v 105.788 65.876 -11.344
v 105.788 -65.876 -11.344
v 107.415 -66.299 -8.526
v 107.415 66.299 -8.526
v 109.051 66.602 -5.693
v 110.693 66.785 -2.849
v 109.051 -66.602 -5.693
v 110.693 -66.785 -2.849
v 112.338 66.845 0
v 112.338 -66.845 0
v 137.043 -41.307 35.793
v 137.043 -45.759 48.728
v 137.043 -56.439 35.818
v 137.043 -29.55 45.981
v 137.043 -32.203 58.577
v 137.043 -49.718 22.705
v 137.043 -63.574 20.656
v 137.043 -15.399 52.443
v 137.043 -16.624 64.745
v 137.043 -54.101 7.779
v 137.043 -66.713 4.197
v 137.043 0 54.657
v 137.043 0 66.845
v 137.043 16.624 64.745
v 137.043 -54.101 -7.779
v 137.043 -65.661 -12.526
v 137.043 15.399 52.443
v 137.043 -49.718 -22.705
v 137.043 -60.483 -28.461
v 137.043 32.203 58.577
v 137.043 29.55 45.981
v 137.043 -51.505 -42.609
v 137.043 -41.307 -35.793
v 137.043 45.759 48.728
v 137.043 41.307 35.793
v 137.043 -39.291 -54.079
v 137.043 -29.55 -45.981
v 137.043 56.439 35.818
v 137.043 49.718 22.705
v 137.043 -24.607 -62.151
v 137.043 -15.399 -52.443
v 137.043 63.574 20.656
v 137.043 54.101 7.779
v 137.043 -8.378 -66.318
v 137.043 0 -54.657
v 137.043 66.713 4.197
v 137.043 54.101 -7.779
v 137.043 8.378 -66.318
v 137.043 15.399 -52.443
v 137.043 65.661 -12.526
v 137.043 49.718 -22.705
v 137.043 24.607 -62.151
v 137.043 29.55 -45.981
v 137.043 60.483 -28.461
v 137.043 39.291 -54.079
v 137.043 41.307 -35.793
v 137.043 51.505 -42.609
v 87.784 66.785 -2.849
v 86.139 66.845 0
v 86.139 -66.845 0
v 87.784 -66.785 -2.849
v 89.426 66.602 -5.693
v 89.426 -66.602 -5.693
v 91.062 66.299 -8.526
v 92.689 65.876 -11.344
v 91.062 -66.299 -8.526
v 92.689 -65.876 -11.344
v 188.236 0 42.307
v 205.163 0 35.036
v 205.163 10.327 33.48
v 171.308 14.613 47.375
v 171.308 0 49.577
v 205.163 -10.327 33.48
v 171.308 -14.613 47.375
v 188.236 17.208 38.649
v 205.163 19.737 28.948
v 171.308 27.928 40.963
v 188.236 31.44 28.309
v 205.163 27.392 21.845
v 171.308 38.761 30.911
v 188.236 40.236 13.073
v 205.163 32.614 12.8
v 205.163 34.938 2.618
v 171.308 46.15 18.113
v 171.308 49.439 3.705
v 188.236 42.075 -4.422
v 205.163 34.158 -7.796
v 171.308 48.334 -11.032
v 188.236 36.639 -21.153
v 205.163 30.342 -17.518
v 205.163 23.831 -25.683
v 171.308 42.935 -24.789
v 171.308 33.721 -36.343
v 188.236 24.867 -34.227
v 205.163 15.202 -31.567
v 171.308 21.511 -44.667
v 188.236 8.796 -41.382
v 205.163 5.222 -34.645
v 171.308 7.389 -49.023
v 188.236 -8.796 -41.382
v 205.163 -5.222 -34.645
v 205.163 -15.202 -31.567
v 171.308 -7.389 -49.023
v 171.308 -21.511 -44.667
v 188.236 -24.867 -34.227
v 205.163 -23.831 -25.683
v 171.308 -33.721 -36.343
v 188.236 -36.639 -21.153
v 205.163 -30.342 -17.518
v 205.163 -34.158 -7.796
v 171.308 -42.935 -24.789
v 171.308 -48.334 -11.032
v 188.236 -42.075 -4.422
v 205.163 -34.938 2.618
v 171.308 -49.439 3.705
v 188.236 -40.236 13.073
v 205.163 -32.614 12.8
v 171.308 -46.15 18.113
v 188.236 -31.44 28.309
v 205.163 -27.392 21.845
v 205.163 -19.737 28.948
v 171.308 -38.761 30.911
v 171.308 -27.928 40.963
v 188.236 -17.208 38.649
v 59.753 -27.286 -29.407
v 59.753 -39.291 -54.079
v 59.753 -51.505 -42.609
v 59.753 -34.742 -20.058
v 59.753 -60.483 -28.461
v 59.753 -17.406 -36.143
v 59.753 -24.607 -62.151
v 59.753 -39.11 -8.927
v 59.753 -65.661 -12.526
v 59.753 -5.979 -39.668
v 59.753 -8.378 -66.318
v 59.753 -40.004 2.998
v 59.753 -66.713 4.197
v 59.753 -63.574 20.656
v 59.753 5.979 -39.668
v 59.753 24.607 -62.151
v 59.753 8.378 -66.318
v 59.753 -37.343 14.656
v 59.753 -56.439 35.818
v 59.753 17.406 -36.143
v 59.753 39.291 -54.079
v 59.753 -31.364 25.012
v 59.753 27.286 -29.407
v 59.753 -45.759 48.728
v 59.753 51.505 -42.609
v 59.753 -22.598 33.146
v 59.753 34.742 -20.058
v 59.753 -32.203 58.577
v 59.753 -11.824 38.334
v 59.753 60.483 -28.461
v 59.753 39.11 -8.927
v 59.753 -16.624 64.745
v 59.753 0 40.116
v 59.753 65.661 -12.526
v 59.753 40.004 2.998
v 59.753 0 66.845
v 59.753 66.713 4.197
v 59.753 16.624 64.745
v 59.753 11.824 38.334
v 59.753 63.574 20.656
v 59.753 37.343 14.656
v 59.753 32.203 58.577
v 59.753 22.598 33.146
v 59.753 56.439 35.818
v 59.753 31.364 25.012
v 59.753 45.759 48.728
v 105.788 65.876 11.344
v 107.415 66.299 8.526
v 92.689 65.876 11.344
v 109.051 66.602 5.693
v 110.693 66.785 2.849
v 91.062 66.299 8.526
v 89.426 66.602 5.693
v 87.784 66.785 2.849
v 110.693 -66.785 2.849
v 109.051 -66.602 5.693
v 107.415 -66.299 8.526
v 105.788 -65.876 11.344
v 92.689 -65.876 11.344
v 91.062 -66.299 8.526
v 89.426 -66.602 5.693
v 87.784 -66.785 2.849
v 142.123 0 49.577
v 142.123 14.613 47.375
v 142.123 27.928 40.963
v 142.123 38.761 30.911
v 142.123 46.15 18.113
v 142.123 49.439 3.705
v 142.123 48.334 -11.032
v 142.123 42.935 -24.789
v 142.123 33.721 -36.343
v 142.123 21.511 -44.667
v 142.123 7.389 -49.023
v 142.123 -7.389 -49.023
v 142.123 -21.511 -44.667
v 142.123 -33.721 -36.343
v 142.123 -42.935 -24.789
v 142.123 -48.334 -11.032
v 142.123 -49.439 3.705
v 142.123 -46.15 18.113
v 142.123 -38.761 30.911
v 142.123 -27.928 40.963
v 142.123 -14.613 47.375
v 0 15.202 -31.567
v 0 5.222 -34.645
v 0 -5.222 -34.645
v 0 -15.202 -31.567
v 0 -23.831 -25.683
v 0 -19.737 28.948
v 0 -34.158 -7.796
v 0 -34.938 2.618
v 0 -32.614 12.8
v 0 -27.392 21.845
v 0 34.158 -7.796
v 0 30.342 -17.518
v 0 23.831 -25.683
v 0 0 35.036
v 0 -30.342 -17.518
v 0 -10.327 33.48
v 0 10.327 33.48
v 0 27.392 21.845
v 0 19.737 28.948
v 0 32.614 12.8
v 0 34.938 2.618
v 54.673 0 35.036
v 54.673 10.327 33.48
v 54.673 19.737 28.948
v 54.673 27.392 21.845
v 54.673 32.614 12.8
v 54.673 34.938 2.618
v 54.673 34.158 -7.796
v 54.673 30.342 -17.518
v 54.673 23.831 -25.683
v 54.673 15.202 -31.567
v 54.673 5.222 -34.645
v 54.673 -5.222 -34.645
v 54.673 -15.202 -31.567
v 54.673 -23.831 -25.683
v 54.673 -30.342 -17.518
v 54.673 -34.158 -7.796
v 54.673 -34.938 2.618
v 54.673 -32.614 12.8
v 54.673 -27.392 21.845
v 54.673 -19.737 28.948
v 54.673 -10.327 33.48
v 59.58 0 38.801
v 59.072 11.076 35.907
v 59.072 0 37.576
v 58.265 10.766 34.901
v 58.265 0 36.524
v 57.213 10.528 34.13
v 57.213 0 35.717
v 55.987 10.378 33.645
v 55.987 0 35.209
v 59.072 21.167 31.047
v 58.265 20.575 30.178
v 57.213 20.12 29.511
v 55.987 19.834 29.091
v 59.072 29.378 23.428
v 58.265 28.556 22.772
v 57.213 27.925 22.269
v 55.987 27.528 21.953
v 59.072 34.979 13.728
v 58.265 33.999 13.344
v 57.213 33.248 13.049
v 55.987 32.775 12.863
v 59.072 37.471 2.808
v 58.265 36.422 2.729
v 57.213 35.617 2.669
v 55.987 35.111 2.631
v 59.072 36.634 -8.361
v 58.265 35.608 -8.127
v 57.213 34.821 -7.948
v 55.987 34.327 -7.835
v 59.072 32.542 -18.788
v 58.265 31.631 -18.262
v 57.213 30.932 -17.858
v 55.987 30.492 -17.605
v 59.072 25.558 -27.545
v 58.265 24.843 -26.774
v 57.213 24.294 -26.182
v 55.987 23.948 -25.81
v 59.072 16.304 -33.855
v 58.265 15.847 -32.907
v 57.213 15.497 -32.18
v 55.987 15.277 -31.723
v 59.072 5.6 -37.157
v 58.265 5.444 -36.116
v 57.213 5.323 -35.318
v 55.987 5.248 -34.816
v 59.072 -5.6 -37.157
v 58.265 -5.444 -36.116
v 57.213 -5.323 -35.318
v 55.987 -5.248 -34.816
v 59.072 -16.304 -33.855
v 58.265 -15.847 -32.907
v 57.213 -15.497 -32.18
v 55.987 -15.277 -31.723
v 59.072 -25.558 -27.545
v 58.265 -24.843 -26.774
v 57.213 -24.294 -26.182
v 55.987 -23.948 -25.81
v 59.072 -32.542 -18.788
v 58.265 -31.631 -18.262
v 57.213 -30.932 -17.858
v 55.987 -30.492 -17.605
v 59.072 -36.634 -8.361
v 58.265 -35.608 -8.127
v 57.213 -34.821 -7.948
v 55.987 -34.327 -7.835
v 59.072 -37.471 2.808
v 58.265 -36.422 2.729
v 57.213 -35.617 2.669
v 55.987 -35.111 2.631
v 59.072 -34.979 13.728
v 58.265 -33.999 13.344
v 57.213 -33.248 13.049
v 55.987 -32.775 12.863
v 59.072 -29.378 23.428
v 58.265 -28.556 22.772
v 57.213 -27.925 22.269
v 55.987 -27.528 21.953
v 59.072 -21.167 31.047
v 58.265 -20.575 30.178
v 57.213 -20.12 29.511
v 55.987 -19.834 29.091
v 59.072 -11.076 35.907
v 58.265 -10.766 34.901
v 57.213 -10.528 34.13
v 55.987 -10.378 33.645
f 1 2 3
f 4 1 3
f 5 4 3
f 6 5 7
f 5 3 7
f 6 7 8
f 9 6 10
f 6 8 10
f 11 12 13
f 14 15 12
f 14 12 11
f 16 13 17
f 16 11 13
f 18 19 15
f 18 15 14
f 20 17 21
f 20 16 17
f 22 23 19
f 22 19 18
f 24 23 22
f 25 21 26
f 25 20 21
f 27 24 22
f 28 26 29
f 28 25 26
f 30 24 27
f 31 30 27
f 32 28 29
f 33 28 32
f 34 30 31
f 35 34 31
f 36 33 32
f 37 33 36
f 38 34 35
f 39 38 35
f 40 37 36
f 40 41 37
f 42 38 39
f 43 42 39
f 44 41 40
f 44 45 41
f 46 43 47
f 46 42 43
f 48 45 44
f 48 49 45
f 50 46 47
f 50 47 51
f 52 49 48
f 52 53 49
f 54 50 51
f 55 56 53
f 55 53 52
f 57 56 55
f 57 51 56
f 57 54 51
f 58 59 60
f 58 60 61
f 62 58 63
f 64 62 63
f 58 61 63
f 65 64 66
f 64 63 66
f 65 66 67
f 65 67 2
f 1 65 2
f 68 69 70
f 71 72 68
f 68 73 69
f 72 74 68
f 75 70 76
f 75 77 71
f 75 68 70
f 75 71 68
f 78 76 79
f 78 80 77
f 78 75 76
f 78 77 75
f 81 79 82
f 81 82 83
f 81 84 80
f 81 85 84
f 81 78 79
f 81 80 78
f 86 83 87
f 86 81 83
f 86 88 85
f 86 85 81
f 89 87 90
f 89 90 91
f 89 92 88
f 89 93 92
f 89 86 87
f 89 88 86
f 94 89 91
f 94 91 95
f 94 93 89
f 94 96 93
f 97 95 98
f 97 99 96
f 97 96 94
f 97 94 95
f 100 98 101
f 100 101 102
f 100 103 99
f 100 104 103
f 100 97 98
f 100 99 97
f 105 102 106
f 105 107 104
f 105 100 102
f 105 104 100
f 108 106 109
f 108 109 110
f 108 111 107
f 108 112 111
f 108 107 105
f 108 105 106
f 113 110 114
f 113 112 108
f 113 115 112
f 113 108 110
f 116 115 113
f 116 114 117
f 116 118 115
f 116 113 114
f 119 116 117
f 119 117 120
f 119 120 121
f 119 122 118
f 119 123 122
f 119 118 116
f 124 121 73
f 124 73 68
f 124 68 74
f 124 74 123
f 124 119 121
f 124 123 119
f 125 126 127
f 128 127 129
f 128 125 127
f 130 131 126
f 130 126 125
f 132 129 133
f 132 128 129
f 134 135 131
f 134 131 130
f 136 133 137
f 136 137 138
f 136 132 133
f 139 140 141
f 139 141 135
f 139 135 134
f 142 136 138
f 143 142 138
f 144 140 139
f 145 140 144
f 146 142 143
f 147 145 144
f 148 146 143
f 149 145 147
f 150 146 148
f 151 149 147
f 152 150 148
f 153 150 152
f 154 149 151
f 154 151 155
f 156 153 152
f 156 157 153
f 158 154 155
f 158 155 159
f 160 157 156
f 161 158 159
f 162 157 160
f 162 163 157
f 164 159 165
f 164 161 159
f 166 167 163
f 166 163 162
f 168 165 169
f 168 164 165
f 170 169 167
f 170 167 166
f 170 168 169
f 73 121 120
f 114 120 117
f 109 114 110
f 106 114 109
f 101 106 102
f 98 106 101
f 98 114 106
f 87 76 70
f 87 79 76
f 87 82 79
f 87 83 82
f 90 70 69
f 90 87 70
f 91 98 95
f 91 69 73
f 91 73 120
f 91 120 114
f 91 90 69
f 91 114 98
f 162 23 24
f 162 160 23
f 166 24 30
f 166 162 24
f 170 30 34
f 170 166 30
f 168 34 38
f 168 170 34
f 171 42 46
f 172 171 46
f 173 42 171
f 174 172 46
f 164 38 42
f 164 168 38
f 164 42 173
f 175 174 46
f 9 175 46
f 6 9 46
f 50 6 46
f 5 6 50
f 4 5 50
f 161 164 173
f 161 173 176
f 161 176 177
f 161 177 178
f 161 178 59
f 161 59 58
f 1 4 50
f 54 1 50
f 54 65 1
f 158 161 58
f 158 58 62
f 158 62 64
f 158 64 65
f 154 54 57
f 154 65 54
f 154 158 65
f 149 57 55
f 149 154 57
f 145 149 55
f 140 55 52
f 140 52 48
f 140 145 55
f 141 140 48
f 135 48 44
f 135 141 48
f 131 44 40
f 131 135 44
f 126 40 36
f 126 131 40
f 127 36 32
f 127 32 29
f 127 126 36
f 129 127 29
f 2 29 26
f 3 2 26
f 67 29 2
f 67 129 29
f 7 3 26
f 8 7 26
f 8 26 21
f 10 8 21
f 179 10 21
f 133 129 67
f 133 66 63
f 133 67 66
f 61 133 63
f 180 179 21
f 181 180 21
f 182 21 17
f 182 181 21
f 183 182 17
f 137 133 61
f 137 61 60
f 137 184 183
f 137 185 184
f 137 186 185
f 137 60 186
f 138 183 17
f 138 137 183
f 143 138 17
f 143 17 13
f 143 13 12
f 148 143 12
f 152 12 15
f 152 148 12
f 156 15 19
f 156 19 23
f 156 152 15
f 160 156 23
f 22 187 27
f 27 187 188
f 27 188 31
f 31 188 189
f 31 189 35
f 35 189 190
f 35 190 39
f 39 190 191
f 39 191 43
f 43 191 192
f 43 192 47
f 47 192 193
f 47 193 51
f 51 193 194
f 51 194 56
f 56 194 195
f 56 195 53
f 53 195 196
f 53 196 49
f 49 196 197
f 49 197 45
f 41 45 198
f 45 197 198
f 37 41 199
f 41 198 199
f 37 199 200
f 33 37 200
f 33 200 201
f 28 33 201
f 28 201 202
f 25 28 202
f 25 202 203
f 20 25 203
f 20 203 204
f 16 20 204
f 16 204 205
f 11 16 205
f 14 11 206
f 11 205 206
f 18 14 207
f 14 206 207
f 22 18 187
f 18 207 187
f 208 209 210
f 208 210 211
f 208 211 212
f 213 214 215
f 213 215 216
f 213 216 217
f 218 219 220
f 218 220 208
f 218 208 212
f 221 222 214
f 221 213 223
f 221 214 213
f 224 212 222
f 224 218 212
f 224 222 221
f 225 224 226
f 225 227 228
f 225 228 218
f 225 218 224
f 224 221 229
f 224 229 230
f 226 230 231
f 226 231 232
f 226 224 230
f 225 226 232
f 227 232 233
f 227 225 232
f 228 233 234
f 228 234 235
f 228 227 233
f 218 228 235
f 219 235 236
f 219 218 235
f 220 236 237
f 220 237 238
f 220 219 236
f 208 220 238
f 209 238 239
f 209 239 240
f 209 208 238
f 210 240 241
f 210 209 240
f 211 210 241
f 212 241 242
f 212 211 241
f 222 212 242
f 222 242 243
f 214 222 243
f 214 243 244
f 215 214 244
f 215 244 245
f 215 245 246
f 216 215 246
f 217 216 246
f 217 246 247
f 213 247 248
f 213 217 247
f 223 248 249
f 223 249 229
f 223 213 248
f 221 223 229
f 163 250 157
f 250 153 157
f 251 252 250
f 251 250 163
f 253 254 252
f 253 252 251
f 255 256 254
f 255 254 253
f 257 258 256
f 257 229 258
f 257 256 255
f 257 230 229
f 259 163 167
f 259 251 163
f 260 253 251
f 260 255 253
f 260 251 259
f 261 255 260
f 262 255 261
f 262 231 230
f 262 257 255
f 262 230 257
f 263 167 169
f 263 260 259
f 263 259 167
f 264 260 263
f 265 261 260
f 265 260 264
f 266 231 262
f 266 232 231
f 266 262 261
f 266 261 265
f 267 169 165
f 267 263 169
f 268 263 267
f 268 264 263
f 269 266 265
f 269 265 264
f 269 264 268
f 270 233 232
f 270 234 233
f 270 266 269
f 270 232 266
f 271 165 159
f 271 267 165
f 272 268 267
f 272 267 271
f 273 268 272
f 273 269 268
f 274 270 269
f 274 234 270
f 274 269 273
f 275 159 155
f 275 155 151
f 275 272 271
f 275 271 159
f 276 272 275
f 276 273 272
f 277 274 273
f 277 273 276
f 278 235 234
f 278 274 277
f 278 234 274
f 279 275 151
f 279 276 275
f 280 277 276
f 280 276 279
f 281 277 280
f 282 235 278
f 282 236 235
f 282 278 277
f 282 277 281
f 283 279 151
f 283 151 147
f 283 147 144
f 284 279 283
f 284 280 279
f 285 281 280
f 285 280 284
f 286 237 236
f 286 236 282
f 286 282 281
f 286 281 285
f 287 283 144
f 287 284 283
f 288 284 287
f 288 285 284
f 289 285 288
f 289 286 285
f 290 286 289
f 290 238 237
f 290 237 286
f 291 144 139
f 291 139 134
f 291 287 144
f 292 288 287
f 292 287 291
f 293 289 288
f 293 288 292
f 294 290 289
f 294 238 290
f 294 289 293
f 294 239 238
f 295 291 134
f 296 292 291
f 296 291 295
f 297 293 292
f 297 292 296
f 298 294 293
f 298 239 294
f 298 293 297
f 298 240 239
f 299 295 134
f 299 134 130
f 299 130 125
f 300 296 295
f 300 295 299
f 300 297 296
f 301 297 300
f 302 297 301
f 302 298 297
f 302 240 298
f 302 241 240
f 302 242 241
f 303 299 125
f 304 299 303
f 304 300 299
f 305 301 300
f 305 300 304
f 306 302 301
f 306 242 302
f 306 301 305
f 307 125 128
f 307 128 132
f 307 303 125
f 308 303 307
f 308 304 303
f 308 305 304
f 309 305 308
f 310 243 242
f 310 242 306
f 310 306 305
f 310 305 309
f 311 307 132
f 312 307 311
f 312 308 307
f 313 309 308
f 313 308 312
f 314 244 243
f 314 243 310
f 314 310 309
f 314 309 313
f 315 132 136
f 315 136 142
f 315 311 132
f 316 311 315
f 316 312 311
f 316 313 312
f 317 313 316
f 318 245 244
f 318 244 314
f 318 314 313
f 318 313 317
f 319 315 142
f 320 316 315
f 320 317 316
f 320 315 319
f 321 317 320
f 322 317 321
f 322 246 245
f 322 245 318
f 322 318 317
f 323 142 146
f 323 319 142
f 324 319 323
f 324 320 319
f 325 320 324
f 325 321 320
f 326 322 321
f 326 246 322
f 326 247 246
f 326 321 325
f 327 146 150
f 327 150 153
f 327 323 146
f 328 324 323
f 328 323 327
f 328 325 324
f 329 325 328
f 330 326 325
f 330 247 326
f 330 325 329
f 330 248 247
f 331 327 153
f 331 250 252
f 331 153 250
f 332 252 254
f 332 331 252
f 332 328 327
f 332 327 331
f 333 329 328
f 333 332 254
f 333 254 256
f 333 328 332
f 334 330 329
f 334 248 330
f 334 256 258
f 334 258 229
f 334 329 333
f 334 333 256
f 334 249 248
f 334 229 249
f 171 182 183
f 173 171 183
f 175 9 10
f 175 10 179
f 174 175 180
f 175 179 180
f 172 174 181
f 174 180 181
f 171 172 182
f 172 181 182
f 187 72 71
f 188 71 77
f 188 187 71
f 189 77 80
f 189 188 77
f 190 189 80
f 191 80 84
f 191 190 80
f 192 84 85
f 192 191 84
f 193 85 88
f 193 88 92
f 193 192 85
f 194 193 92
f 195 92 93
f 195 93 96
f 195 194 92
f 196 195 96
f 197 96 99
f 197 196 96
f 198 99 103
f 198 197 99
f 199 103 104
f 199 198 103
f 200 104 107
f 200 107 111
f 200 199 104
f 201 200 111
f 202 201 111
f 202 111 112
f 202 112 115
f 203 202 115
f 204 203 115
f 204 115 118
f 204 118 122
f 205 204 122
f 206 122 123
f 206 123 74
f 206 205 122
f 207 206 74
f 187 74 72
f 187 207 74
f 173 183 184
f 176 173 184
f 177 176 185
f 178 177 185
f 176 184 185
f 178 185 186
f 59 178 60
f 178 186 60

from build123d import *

# Parameters (mm, degrees)
F2_R          = 5.08
F3_SIZE       = 5.08
F5_DEPTH      = 67.8453350663
F5_DEPTH_BACK = 67.8453350663


with BuildPart() as f1:
    # F0 (on Front) → F1 (revolve)
    with BuildSketch(Plane.XZ):
        Polygon((0, 35.0362285972), (0, 0), (205.1634937525, 0), (205.1634937525, 35.0362285972), (171.3081896305, 49.5771542192), (137.0425224304, 49.5771542192), (137.0425224304, 66.8453350663), (59.7526952624, 66.8453350663), (59.7526952624, 35.0362285972), align=None)
    revolve(axis=Axis((102.5817468762, 0, 0), (-1, 0, 0)))

    # F2
    f2_edges = [f1.edges().sort_by_distance(p)[0] for p in [
        (59.752695, 0, -35.036229),
    ]]
    fillet(f2_edges, radius=F2_R)

    # F3
    f3_edges = [f1.edges().sort_by_distance(p)[0] for p in [
        (137.042522, 0, -49.577154),
    ]]
    chamfer(f3_edges, length=F3_SIZE)

    # F4 (on Front) → F5 (cut, two sides)
    with BuildSketch(Plane.XZ) as f5_sk:
        Polygon((92.6886847283, -11.3443676382), (105.7880321477, -11.3443676382), (112.3377058575, 0), (105.7880321477, 11.3443676382), (92.6886847283, 11.3443676382), (86.1390110186, 0), align=None)
    extrude(amount=F5_DEPTH, mode=Mode.SUBTRACT)
    extrude(f5_sk.sketch, amount=-F5_DEPTH_BACK, mode=Mode.SUBTRACT)


solid = f1.part
